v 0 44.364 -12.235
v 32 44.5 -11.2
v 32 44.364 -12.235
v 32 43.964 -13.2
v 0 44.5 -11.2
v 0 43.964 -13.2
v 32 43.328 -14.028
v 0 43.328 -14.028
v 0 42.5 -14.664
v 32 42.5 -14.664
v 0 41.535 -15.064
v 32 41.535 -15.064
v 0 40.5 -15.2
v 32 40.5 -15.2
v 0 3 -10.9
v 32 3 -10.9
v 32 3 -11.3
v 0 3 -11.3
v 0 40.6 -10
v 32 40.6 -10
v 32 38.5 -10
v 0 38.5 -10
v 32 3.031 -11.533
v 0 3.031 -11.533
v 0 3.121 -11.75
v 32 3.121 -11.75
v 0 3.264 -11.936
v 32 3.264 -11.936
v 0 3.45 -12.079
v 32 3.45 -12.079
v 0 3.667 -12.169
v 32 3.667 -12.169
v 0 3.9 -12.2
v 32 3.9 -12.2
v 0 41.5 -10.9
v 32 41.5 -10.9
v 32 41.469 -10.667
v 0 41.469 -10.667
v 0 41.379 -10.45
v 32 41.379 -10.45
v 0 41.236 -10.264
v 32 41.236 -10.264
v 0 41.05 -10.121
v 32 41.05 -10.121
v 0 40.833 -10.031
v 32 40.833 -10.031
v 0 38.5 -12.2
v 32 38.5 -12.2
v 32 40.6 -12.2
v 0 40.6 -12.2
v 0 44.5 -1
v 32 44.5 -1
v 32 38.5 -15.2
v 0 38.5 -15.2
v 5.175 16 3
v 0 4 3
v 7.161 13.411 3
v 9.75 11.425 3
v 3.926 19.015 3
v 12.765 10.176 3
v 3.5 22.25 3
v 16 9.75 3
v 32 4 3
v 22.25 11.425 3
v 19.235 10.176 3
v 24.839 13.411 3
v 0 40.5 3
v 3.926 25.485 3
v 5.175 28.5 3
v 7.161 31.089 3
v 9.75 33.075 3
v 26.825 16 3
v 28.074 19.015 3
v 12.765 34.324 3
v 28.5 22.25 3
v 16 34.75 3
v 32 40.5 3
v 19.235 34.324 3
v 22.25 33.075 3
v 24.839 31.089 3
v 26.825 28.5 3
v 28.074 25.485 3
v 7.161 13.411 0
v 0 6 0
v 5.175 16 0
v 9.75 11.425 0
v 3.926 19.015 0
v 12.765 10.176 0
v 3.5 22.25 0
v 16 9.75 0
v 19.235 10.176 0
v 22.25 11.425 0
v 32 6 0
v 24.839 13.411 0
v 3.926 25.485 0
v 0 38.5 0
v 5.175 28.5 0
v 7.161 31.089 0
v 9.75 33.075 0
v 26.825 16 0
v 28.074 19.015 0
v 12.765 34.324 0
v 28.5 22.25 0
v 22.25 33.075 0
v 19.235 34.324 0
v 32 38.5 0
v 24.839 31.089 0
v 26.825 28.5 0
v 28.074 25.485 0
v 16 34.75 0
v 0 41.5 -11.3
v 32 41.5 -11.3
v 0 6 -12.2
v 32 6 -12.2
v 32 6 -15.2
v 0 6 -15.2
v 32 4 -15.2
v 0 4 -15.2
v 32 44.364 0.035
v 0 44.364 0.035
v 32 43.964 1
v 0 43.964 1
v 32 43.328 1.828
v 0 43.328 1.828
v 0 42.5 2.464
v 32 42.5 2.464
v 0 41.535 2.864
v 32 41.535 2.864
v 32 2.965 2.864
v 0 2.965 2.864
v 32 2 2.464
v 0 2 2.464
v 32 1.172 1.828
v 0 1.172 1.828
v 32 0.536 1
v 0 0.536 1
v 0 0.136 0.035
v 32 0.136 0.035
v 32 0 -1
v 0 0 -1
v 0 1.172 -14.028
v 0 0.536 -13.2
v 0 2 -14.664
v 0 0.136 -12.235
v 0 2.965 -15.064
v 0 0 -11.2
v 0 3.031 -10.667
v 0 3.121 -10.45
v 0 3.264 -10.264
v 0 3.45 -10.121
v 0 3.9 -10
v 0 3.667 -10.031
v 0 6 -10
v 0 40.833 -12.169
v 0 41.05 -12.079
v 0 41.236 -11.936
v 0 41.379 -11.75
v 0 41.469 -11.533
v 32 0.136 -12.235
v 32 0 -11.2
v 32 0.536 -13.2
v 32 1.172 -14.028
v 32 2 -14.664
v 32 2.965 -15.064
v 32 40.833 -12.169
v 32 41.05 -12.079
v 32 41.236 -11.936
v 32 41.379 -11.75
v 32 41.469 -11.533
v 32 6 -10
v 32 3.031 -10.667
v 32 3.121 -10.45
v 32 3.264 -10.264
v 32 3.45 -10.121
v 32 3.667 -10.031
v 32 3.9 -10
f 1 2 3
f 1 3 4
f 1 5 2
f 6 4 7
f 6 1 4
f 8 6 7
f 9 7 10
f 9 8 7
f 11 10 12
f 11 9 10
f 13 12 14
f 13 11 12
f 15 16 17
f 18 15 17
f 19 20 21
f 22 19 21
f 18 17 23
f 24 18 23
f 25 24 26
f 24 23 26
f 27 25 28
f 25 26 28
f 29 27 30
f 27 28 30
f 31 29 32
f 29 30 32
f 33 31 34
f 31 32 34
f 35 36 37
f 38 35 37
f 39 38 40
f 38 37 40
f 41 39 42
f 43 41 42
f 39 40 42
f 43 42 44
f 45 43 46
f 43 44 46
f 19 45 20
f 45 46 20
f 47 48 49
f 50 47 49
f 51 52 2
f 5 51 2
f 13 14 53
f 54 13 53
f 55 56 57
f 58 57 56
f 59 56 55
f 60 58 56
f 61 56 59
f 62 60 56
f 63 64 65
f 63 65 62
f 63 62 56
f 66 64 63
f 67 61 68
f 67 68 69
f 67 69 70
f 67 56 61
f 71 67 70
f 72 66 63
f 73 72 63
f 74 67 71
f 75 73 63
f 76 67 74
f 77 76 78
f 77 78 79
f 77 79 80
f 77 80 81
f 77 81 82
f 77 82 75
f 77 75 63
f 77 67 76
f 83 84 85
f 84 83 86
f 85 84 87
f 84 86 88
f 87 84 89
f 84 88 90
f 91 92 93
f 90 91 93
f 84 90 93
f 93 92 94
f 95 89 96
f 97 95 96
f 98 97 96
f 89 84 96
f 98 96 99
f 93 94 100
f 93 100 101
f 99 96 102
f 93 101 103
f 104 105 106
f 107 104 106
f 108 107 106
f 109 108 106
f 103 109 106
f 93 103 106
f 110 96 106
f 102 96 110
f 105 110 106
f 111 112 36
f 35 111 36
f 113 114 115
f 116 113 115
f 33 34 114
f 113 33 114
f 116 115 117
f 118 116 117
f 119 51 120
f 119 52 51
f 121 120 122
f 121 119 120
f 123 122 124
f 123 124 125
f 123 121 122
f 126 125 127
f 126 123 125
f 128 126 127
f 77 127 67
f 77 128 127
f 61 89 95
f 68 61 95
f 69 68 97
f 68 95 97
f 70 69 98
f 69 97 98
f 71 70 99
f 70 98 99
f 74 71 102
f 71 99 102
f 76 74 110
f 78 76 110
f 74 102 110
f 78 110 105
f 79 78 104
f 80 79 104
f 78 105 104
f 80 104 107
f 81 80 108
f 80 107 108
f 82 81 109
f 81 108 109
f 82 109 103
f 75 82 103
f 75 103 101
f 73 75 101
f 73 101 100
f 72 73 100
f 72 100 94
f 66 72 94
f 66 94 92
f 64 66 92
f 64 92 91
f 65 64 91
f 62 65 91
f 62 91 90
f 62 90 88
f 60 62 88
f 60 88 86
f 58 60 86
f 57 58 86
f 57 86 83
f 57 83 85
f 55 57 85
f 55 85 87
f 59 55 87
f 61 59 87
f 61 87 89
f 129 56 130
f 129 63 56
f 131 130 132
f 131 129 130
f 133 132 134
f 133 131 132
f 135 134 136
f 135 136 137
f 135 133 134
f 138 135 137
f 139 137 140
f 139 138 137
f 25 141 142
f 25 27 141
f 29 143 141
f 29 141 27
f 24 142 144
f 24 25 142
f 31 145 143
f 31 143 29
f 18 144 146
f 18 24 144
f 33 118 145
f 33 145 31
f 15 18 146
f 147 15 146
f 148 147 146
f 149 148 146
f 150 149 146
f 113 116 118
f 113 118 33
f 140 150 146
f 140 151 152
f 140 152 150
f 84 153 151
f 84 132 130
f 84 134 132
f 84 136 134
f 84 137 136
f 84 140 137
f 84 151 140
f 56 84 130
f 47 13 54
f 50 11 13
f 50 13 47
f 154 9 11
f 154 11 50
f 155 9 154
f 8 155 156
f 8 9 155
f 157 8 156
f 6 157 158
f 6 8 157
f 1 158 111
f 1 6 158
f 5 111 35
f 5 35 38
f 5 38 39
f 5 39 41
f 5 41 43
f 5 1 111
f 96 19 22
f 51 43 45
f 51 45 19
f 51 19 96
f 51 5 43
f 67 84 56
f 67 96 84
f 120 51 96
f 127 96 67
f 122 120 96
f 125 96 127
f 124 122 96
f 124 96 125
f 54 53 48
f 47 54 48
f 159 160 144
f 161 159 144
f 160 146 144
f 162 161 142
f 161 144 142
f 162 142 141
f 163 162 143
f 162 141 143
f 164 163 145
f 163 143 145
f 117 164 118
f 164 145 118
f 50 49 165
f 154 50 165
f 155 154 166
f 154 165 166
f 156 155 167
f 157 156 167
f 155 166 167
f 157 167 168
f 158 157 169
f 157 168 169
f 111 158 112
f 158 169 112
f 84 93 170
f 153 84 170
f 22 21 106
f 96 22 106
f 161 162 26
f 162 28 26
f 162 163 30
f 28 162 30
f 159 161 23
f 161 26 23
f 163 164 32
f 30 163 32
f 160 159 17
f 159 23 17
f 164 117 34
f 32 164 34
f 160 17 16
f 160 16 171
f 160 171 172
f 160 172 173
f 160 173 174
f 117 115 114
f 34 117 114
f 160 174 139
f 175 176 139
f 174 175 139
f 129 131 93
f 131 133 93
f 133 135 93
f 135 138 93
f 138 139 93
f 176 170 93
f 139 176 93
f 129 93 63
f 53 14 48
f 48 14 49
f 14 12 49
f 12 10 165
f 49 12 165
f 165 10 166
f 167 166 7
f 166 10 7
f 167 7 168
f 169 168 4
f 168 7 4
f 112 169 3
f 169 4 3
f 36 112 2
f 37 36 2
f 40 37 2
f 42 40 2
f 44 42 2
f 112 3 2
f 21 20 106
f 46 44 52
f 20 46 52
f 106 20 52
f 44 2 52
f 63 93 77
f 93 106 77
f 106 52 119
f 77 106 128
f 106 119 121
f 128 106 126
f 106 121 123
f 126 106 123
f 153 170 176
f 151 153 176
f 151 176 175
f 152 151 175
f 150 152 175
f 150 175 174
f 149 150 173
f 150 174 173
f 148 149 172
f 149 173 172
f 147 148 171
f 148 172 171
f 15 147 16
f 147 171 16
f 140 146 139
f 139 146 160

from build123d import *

# Parameters (mm, degrees)
SKIZZE1_W                       = 32
SKIZZE1_H                       = 44.5
AUFSATZ_LINEAR_AUSTRAGEN1_DEPTH = 3
AUFSATZ_LINEAR_AUSTRAGEN2_DEPTH = 32
SKIZZE3_R                       = 12.5
SCHNITT_LINEAR_AUSTRAGEN1_DEPTH = 57.879609703
VERRUNDUNG1_R                   = 4
VERRUNDUNG2_R                   = 4


with BuildPart() as part:
    # Skizze1 → Aufsatz-Linear austragen1 (new body)
    with BuildSketch(Plane.XY):
        with Locations((16, 22.25)):
            Rectangle(SKIZZE1_W, SKIZZE1_H)
    extrude(amount=AUFSATZ_LINEAR_AUSTRAGEN1_DEPTH)

    # Skizze2 → Aufsatz-Linear austragen2 (add, through all)
    with BuildSketch(Plane(origin=(32, 0, 0), x_dir=(0, 0, -1), z_dir=(1, 0, 0))):
        with BuildLine():
            Line((0, 44.5), (15.2, 44.5))
            Line((15.2, 44.5), (15.2, 38.5))
            Line((15.2, 38.5), (12.2, 38.5))
            Line((12.2, 38.5), (12.2, 40.6))
            ThreePointArc((12.2, 40.6), (11.936396103, 41.236396103), (11.3, 41.5))
            Line((11.3, 41.5), (10.9, 41.5))
            ThreePointArc((10.9, 41.5), (10.263603897, 41.236396103), (10, 40.6))
            Line((10, 40.6), (10, 38.5))
            Line((10, 38.5), (-3, 38.5))
            Line((-3, 38.5), (-3, 44.5))
            Line((-3, 44.5), (0, 44.5))
        make_face()
        with BuildLine():
            Line((0, 0), (-3, 0))
            Line((-3, 0), (-3, 6))
            Line((-3, 6), (10, 6))
            Line((10, 6), (10, 3.9))
            ThreePointArc((10, 3.9), (10.263603897, 3.263603897), (10.9, 3))
            Line((10.9, 3), (11.3, 3))
            ThreePointArc((11.3, 3), (11.936396103, 3.263603897), (12.2, 3.9))
            Line((12.2, 3.9), (12.2, 6))
            Line((12.2, 6), (15.2, 6))
            Line((15.2, 6), (15.2, 0))
            Line((15.2, 0), (0, 0))
        make_face()
    extrude(amount=-AUFSATZ_LINEAR_AUSTRAGEN2_DEPTH)

    # Skizze3 → Schnitt-Linear austragen1 (cut, through all)
    with BuildSketch(Plane(origin=(0, 0, 0), x_dir=(-1, 0, 0), z_dir=(0, 0, -1))):
        with Locations((-16, 22.25)):
            Circle(SKIZZE3_R)
    extrude(amount=-SCHNITT_LINEAR_AUSTRAGEN1_DEPTH, mode=Mode.SUBTRACT)

    # Verrundung1
    verrundung1_edges = [part.edges().sort_by_distance(p)[0] for p in [
        (16, 44.5, 3),
        (16, 0, 3),
    ]]
    fillet(verrundung1_edges, radius=VERRUNDUNG1_R)

    # Verrundung2
    verrundung2_edges = [part.edges().sort_by_distance(p)[0] for p in [
        (16, 44.5, -15.2),
        (16, 0, -15.2),
    ]]
    fillet(verrundung2_edges, radius=VERRUNDUNG2_R)


solid = part.part
